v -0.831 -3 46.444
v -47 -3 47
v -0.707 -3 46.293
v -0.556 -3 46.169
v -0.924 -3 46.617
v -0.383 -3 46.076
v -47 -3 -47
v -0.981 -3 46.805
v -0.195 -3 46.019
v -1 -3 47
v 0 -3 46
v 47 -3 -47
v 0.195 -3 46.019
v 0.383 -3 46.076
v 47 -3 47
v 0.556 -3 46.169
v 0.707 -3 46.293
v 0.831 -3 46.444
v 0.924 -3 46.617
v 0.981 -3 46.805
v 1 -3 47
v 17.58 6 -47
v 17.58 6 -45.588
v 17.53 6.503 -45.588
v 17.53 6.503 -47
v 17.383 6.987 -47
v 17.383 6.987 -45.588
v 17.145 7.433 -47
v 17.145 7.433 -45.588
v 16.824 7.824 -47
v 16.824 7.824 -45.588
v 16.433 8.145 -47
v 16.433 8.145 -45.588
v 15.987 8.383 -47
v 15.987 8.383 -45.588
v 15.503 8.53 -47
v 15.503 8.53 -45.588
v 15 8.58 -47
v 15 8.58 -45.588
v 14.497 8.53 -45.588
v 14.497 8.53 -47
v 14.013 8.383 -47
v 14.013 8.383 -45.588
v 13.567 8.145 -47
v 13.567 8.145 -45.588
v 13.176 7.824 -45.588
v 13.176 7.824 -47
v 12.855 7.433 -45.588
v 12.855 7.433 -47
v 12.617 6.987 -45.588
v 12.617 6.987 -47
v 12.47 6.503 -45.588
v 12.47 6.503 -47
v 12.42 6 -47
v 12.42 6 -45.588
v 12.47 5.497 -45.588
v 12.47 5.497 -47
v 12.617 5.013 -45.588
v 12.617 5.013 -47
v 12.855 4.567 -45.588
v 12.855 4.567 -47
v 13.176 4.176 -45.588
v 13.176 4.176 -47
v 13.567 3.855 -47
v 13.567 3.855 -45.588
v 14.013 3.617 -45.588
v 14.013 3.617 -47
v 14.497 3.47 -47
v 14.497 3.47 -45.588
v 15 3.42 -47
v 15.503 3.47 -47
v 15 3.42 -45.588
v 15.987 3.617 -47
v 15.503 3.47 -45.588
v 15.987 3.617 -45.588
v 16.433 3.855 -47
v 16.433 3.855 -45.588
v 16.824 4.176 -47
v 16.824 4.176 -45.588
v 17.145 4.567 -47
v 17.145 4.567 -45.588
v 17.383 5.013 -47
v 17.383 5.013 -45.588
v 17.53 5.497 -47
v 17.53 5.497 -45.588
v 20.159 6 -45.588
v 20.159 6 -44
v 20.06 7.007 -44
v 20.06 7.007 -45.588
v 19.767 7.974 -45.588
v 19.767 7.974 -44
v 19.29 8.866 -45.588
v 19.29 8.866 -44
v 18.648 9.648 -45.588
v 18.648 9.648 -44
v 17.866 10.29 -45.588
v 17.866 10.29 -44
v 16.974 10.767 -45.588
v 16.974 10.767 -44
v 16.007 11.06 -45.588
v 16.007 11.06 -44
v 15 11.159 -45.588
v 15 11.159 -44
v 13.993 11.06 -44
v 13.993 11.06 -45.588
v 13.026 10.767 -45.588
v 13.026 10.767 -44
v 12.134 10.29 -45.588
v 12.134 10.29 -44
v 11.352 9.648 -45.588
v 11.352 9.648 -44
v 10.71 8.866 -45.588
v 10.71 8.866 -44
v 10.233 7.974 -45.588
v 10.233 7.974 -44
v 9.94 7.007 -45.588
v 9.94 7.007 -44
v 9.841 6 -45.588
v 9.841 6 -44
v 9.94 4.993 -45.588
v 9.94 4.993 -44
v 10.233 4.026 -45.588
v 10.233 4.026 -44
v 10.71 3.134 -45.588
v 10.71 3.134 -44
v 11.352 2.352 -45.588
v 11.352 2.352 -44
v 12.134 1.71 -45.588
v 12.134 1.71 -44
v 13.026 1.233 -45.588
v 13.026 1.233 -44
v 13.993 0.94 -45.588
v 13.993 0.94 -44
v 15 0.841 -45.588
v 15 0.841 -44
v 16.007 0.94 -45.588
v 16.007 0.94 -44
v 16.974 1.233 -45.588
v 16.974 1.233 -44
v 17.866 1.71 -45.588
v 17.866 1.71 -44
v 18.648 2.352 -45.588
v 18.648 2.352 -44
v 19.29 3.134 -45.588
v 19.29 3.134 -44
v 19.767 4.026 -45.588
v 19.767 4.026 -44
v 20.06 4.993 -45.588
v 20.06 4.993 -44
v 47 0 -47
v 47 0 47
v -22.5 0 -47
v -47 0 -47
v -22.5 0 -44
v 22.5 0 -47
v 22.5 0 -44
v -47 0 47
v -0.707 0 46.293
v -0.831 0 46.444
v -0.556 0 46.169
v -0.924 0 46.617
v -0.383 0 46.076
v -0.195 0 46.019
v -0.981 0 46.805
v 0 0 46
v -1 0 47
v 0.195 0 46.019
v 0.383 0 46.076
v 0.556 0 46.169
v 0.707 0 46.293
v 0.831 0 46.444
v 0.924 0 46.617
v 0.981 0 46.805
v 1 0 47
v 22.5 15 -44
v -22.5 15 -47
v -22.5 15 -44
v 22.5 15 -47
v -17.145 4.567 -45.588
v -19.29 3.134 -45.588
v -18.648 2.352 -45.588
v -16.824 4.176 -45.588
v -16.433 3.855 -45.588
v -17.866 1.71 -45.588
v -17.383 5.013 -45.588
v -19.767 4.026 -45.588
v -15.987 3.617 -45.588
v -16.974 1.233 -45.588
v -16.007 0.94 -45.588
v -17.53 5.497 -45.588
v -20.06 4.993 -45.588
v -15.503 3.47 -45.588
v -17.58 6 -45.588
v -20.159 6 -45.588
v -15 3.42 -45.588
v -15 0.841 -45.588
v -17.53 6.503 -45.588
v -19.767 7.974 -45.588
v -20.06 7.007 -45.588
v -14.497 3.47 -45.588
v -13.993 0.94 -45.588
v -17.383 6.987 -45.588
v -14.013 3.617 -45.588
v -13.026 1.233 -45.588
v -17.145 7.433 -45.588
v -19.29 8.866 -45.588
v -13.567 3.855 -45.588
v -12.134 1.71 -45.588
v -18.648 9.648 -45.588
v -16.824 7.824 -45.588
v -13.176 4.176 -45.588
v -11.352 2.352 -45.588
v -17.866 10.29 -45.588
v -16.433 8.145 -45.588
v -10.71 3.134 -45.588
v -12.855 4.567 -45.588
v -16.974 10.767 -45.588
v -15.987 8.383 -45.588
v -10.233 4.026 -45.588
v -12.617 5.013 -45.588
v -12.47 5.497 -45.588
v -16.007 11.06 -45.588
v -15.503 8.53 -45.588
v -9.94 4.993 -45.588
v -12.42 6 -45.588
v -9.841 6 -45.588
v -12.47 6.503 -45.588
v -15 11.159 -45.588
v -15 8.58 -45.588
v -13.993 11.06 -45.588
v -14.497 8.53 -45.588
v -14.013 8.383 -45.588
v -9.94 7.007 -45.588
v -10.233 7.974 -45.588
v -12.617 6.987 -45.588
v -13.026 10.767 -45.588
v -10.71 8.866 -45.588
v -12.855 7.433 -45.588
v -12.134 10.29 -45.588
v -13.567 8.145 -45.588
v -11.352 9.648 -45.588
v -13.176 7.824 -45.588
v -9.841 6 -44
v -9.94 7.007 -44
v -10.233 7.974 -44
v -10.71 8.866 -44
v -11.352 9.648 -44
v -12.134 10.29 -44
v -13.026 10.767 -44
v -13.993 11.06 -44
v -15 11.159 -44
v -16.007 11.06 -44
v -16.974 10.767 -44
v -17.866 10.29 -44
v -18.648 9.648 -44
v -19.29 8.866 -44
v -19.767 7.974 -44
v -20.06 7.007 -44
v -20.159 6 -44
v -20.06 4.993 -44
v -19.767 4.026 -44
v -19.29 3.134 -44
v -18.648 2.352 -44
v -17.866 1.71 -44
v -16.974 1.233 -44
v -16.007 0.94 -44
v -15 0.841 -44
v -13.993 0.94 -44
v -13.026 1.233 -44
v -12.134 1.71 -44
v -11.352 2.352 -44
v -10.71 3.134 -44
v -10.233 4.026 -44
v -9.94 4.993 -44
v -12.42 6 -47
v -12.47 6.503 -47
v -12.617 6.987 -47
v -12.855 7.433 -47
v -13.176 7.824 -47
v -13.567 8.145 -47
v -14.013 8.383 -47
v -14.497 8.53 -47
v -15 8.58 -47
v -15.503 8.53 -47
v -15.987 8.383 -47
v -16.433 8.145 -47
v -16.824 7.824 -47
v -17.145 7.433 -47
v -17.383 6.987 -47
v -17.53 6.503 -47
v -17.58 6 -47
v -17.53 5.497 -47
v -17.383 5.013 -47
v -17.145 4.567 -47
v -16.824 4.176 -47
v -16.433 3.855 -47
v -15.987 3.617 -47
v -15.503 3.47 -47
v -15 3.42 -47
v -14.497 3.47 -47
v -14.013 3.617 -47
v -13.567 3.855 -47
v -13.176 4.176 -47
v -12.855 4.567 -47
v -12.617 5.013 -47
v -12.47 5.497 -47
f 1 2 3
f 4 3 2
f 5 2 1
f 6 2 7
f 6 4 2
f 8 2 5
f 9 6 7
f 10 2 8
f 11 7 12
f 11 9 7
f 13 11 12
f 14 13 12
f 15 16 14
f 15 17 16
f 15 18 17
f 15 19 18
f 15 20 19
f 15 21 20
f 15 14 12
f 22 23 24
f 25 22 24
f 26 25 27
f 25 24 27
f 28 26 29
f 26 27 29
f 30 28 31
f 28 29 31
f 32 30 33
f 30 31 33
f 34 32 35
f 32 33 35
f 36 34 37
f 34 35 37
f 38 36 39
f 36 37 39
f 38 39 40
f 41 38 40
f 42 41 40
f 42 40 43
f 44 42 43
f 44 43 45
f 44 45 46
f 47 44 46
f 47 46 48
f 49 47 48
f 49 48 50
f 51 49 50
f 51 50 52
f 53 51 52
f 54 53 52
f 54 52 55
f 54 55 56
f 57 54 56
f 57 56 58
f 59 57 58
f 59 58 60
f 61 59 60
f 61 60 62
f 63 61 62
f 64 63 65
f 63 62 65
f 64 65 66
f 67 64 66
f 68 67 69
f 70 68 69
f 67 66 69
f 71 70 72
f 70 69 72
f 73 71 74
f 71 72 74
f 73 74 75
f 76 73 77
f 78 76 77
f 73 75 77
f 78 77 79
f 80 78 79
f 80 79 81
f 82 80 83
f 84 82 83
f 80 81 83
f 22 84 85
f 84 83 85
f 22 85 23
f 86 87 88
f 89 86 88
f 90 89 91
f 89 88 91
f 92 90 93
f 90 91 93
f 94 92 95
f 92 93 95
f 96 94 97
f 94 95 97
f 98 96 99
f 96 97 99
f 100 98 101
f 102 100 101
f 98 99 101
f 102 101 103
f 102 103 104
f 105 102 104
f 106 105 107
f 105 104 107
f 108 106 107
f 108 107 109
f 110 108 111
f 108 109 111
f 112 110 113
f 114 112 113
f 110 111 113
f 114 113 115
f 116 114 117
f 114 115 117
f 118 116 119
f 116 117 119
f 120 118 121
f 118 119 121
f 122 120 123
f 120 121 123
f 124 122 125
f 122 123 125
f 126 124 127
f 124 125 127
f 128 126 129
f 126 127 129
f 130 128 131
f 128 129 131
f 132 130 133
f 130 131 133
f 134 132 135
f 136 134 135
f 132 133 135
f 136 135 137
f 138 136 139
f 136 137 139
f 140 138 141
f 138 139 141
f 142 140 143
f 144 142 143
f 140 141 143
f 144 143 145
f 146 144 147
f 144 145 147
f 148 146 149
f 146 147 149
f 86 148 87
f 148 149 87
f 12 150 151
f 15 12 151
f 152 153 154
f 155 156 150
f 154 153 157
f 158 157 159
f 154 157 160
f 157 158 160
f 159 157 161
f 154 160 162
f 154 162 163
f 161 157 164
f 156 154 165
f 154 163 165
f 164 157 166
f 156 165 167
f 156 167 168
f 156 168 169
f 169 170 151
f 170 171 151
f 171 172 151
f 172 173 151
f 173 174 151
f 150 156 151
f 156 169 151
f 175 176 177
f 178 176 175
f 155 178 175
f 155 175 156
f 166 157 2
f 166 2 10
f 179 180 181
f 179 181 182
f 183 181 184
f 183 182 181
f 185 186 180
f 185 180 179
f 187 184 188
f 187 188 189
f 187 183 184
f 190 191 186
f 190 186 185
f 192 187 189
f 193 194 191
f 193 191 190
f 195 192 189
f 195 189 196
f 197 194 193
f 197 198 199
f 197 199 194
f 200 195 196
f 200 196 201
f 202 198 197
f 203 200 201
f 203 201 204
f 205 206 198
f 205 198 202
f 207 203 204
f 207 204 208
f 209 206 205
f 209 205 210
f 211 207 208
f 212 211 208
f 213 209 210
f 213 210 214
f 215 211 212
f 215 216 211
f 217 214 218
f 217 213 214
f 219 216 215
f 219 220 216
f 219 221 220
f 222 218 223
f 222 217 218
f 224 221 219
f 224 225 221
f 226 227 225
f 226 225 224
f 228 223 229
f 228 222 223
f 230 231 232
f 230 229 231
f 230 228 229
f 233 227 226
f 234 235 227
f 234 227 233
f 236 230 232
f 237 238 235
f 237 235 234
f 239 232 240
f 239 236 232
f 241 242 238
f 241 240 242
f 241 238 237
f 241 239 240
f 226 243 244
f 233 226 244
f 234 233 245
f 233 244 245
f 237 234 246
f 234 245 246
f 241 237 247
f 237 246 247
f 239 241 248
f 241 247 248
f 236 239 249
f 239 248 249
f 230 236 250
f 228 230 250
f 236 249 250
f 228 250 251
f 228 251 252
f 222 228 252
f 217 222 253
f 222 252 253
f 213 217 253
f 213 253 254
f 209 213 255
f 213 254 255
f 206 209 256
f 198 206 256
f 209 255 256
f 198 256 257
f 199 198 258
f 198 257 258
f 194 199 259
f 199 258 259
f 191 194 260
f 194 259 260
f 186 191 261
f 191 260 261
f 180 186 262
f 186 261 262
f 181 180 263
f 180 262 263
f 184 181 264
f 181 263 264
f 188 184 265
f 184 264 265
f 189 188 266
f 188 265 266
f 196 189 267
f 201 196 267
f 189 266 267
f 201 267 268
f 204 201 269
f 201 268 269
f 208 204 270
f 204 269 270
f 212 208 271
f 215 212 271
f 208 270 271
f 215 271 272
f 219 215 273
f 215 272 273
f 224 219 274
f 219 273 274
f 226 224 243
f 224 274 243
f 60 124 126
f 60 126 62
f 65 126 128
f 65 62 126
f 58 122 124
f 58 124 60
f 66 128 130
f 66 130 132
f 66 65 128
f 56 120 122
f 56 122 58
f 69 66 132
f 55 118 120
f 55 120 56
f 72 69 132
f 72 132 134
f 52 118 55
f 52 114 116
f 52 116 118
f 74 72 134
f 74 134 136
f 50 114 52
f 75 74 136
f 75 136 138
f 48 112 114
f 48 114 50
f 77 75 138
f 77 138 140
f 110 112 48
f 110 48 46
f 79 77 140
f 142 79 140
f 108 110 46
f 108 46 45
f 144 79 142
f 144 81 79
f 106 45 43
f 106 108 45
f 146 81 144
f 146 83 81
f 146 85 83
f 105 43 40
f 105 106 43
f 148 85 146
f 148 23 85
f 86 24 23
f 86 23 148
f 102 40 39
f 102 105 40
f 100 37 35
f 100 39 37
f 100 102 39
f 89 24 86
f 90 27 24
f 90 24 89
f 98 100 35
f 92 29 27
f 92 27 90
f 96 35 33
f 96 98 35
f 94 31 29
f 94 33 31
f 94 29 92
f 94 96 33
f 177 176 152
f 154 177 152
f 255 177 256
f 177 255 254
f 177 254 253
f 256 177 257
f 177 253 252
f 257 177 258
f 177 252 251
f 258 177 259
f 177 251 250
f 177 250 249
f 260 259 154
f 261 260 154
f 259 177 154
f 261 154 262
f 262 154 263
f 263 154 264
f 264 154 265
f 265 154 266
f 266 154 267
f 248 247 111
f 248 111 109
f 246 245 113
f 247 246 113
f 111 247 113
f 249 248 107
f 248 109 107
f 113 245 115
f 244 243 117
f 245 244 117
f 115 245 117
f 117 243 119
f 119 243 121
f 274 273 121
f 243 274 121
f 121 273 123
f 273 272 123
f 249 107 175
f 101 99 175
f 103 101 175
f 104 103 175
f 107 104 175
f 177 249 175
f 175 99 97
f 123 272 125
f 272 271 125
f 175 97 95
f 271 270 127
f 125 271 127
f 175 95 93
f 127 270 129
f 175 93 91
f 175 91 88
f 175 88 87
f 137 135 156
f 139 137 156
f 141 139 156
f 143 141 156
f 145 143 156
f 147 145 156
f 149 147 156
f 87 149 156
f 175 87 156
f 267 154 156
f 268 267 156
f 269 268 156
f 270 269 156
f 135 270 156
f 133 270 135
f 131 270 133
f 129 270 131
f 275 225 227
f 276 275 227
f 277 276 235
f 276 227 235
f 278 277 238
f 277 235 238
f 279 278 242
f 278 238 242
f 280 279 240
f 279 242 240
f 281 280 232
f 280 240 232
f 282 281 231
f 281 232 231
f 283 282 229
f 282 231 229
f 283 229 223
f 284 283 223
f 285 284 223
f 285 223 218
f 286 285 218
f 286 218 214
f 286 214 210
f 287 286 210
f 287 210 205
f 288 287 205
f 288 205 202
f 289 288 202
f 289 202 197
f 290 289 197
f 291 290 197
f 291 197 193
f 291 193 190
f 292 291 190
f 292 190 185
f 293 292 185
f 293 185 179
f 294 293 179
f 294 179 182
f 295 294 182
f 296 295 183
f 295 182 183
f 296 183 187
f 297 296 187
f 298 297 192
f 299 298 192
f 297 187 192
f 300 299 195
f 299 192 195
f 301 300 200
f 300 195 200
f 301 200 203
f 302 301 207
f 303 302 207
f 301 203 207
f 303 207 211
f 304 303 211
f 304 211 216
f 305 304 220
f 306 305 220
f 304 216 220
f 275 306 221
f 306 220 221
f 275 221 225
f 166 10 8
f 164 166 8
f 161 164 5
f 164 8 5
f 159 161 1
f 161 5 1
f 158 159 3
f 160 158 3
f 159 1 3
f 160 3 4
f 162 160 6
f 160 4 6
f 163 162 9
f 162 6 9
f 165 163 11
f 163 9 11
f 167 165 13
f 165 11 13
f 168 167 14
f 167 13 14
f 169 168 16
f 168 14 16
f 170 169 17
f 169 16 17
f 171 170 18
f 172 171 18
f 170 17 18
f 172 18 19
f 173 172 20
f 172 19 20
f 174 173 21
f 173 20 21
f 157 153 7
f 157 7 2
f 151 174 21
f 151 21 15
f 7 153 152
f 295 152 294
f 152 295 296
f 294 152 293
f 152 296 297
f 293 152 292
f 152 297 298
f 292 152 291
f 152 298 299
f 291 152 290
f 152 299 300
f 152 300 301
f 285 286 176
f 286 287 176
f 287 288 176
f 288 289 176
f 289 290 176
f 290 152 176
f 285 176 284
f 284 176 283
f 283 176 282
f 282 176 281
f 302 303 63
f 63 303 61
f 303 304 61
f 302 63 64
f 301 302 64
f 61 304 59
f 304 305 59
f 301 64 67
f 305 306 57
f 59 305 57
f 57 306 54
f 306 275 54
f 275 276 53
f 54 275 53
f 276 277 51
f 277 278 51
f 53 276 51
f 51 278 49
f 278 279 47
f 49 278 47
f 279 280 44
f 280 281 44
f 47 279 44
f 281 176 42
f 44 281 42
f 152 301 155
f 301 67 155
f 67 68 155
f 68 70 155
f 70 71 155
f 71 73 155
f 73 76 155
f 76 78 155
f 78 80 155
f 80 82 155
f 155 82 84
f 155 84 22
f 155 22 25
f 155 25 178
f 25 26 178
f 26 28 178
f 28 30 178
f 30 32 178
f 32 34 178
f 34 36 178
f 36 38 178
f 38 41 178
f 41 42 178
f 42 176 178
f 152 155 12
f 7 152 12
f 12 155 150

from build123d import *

# Parameters (mm, degrees)
F0_W     = 94
F0_H     = 94
F1_DEPTH = 3
F2_W     = 45
F2_H     = 15
F3_DEPTH = 3
F4_R     = 2.5796875
F5_DEPTH = 3.001
F6_R     = 5.159375
F7_DEPTH = 1.5875
F8_R     = 1
F9_DEPTH = 18.001


# Not quite as in the source:
# - a length typed as a fraction of an inch, garbled in the dataset ("3 / 203.2 mm" for 3/8 in), is restored


with BuildPart() as f1:
    # F0 (on Front) → F1 (new body)
    with BuildSketch(Plane.XZ):
        Rectangle(F0_W, F0_H)
    extrude(amount=F1_DEPTH)

    # F2 (on face) → F3 (join)
    with BuildSketch(Plane(origin=(0, 0, -47), x_dir=(1, 0, 0), z_dir=(0, 0, -1))):
        with Locations((0, -7.5)):
            Rectangle(F2_W, F2_H)
    extrude(amount=-F3_DEPTH)

    # F4 (on face) → F5 (cut, through all)
    with BuildSketch(Plane.XY.offset(-44)):
        with Locations((-15, 6)):
            Circle(F4_R)
        with Locations((15, 6)):
            Circle(F4_R)
    extrude(amount=-F5_DEPTH, mode=Mode.SUBTRACT)

    # F6 (on face) → F7 (cut)
    with BuildSketch(Plane.XY.offset(-44)):
        with Locations((-15, 6)):
            Circle(F6_R)
        with Locations((15, 6)):
            Circle(F6_R)
    extrude(amount=-F7_DEPTH, mode=Mode.SUBTRACT)

    # F8 (on face) → F9 (cut, through all)
    with BuildSketch(Plane.XZ.offset(3)):
        with Locations((0, 47)):
            Circle(F8_R)
    extrude(amount=-F9_DEPTH, mode=Mode.SUBTRACT)


solid = f1.part
